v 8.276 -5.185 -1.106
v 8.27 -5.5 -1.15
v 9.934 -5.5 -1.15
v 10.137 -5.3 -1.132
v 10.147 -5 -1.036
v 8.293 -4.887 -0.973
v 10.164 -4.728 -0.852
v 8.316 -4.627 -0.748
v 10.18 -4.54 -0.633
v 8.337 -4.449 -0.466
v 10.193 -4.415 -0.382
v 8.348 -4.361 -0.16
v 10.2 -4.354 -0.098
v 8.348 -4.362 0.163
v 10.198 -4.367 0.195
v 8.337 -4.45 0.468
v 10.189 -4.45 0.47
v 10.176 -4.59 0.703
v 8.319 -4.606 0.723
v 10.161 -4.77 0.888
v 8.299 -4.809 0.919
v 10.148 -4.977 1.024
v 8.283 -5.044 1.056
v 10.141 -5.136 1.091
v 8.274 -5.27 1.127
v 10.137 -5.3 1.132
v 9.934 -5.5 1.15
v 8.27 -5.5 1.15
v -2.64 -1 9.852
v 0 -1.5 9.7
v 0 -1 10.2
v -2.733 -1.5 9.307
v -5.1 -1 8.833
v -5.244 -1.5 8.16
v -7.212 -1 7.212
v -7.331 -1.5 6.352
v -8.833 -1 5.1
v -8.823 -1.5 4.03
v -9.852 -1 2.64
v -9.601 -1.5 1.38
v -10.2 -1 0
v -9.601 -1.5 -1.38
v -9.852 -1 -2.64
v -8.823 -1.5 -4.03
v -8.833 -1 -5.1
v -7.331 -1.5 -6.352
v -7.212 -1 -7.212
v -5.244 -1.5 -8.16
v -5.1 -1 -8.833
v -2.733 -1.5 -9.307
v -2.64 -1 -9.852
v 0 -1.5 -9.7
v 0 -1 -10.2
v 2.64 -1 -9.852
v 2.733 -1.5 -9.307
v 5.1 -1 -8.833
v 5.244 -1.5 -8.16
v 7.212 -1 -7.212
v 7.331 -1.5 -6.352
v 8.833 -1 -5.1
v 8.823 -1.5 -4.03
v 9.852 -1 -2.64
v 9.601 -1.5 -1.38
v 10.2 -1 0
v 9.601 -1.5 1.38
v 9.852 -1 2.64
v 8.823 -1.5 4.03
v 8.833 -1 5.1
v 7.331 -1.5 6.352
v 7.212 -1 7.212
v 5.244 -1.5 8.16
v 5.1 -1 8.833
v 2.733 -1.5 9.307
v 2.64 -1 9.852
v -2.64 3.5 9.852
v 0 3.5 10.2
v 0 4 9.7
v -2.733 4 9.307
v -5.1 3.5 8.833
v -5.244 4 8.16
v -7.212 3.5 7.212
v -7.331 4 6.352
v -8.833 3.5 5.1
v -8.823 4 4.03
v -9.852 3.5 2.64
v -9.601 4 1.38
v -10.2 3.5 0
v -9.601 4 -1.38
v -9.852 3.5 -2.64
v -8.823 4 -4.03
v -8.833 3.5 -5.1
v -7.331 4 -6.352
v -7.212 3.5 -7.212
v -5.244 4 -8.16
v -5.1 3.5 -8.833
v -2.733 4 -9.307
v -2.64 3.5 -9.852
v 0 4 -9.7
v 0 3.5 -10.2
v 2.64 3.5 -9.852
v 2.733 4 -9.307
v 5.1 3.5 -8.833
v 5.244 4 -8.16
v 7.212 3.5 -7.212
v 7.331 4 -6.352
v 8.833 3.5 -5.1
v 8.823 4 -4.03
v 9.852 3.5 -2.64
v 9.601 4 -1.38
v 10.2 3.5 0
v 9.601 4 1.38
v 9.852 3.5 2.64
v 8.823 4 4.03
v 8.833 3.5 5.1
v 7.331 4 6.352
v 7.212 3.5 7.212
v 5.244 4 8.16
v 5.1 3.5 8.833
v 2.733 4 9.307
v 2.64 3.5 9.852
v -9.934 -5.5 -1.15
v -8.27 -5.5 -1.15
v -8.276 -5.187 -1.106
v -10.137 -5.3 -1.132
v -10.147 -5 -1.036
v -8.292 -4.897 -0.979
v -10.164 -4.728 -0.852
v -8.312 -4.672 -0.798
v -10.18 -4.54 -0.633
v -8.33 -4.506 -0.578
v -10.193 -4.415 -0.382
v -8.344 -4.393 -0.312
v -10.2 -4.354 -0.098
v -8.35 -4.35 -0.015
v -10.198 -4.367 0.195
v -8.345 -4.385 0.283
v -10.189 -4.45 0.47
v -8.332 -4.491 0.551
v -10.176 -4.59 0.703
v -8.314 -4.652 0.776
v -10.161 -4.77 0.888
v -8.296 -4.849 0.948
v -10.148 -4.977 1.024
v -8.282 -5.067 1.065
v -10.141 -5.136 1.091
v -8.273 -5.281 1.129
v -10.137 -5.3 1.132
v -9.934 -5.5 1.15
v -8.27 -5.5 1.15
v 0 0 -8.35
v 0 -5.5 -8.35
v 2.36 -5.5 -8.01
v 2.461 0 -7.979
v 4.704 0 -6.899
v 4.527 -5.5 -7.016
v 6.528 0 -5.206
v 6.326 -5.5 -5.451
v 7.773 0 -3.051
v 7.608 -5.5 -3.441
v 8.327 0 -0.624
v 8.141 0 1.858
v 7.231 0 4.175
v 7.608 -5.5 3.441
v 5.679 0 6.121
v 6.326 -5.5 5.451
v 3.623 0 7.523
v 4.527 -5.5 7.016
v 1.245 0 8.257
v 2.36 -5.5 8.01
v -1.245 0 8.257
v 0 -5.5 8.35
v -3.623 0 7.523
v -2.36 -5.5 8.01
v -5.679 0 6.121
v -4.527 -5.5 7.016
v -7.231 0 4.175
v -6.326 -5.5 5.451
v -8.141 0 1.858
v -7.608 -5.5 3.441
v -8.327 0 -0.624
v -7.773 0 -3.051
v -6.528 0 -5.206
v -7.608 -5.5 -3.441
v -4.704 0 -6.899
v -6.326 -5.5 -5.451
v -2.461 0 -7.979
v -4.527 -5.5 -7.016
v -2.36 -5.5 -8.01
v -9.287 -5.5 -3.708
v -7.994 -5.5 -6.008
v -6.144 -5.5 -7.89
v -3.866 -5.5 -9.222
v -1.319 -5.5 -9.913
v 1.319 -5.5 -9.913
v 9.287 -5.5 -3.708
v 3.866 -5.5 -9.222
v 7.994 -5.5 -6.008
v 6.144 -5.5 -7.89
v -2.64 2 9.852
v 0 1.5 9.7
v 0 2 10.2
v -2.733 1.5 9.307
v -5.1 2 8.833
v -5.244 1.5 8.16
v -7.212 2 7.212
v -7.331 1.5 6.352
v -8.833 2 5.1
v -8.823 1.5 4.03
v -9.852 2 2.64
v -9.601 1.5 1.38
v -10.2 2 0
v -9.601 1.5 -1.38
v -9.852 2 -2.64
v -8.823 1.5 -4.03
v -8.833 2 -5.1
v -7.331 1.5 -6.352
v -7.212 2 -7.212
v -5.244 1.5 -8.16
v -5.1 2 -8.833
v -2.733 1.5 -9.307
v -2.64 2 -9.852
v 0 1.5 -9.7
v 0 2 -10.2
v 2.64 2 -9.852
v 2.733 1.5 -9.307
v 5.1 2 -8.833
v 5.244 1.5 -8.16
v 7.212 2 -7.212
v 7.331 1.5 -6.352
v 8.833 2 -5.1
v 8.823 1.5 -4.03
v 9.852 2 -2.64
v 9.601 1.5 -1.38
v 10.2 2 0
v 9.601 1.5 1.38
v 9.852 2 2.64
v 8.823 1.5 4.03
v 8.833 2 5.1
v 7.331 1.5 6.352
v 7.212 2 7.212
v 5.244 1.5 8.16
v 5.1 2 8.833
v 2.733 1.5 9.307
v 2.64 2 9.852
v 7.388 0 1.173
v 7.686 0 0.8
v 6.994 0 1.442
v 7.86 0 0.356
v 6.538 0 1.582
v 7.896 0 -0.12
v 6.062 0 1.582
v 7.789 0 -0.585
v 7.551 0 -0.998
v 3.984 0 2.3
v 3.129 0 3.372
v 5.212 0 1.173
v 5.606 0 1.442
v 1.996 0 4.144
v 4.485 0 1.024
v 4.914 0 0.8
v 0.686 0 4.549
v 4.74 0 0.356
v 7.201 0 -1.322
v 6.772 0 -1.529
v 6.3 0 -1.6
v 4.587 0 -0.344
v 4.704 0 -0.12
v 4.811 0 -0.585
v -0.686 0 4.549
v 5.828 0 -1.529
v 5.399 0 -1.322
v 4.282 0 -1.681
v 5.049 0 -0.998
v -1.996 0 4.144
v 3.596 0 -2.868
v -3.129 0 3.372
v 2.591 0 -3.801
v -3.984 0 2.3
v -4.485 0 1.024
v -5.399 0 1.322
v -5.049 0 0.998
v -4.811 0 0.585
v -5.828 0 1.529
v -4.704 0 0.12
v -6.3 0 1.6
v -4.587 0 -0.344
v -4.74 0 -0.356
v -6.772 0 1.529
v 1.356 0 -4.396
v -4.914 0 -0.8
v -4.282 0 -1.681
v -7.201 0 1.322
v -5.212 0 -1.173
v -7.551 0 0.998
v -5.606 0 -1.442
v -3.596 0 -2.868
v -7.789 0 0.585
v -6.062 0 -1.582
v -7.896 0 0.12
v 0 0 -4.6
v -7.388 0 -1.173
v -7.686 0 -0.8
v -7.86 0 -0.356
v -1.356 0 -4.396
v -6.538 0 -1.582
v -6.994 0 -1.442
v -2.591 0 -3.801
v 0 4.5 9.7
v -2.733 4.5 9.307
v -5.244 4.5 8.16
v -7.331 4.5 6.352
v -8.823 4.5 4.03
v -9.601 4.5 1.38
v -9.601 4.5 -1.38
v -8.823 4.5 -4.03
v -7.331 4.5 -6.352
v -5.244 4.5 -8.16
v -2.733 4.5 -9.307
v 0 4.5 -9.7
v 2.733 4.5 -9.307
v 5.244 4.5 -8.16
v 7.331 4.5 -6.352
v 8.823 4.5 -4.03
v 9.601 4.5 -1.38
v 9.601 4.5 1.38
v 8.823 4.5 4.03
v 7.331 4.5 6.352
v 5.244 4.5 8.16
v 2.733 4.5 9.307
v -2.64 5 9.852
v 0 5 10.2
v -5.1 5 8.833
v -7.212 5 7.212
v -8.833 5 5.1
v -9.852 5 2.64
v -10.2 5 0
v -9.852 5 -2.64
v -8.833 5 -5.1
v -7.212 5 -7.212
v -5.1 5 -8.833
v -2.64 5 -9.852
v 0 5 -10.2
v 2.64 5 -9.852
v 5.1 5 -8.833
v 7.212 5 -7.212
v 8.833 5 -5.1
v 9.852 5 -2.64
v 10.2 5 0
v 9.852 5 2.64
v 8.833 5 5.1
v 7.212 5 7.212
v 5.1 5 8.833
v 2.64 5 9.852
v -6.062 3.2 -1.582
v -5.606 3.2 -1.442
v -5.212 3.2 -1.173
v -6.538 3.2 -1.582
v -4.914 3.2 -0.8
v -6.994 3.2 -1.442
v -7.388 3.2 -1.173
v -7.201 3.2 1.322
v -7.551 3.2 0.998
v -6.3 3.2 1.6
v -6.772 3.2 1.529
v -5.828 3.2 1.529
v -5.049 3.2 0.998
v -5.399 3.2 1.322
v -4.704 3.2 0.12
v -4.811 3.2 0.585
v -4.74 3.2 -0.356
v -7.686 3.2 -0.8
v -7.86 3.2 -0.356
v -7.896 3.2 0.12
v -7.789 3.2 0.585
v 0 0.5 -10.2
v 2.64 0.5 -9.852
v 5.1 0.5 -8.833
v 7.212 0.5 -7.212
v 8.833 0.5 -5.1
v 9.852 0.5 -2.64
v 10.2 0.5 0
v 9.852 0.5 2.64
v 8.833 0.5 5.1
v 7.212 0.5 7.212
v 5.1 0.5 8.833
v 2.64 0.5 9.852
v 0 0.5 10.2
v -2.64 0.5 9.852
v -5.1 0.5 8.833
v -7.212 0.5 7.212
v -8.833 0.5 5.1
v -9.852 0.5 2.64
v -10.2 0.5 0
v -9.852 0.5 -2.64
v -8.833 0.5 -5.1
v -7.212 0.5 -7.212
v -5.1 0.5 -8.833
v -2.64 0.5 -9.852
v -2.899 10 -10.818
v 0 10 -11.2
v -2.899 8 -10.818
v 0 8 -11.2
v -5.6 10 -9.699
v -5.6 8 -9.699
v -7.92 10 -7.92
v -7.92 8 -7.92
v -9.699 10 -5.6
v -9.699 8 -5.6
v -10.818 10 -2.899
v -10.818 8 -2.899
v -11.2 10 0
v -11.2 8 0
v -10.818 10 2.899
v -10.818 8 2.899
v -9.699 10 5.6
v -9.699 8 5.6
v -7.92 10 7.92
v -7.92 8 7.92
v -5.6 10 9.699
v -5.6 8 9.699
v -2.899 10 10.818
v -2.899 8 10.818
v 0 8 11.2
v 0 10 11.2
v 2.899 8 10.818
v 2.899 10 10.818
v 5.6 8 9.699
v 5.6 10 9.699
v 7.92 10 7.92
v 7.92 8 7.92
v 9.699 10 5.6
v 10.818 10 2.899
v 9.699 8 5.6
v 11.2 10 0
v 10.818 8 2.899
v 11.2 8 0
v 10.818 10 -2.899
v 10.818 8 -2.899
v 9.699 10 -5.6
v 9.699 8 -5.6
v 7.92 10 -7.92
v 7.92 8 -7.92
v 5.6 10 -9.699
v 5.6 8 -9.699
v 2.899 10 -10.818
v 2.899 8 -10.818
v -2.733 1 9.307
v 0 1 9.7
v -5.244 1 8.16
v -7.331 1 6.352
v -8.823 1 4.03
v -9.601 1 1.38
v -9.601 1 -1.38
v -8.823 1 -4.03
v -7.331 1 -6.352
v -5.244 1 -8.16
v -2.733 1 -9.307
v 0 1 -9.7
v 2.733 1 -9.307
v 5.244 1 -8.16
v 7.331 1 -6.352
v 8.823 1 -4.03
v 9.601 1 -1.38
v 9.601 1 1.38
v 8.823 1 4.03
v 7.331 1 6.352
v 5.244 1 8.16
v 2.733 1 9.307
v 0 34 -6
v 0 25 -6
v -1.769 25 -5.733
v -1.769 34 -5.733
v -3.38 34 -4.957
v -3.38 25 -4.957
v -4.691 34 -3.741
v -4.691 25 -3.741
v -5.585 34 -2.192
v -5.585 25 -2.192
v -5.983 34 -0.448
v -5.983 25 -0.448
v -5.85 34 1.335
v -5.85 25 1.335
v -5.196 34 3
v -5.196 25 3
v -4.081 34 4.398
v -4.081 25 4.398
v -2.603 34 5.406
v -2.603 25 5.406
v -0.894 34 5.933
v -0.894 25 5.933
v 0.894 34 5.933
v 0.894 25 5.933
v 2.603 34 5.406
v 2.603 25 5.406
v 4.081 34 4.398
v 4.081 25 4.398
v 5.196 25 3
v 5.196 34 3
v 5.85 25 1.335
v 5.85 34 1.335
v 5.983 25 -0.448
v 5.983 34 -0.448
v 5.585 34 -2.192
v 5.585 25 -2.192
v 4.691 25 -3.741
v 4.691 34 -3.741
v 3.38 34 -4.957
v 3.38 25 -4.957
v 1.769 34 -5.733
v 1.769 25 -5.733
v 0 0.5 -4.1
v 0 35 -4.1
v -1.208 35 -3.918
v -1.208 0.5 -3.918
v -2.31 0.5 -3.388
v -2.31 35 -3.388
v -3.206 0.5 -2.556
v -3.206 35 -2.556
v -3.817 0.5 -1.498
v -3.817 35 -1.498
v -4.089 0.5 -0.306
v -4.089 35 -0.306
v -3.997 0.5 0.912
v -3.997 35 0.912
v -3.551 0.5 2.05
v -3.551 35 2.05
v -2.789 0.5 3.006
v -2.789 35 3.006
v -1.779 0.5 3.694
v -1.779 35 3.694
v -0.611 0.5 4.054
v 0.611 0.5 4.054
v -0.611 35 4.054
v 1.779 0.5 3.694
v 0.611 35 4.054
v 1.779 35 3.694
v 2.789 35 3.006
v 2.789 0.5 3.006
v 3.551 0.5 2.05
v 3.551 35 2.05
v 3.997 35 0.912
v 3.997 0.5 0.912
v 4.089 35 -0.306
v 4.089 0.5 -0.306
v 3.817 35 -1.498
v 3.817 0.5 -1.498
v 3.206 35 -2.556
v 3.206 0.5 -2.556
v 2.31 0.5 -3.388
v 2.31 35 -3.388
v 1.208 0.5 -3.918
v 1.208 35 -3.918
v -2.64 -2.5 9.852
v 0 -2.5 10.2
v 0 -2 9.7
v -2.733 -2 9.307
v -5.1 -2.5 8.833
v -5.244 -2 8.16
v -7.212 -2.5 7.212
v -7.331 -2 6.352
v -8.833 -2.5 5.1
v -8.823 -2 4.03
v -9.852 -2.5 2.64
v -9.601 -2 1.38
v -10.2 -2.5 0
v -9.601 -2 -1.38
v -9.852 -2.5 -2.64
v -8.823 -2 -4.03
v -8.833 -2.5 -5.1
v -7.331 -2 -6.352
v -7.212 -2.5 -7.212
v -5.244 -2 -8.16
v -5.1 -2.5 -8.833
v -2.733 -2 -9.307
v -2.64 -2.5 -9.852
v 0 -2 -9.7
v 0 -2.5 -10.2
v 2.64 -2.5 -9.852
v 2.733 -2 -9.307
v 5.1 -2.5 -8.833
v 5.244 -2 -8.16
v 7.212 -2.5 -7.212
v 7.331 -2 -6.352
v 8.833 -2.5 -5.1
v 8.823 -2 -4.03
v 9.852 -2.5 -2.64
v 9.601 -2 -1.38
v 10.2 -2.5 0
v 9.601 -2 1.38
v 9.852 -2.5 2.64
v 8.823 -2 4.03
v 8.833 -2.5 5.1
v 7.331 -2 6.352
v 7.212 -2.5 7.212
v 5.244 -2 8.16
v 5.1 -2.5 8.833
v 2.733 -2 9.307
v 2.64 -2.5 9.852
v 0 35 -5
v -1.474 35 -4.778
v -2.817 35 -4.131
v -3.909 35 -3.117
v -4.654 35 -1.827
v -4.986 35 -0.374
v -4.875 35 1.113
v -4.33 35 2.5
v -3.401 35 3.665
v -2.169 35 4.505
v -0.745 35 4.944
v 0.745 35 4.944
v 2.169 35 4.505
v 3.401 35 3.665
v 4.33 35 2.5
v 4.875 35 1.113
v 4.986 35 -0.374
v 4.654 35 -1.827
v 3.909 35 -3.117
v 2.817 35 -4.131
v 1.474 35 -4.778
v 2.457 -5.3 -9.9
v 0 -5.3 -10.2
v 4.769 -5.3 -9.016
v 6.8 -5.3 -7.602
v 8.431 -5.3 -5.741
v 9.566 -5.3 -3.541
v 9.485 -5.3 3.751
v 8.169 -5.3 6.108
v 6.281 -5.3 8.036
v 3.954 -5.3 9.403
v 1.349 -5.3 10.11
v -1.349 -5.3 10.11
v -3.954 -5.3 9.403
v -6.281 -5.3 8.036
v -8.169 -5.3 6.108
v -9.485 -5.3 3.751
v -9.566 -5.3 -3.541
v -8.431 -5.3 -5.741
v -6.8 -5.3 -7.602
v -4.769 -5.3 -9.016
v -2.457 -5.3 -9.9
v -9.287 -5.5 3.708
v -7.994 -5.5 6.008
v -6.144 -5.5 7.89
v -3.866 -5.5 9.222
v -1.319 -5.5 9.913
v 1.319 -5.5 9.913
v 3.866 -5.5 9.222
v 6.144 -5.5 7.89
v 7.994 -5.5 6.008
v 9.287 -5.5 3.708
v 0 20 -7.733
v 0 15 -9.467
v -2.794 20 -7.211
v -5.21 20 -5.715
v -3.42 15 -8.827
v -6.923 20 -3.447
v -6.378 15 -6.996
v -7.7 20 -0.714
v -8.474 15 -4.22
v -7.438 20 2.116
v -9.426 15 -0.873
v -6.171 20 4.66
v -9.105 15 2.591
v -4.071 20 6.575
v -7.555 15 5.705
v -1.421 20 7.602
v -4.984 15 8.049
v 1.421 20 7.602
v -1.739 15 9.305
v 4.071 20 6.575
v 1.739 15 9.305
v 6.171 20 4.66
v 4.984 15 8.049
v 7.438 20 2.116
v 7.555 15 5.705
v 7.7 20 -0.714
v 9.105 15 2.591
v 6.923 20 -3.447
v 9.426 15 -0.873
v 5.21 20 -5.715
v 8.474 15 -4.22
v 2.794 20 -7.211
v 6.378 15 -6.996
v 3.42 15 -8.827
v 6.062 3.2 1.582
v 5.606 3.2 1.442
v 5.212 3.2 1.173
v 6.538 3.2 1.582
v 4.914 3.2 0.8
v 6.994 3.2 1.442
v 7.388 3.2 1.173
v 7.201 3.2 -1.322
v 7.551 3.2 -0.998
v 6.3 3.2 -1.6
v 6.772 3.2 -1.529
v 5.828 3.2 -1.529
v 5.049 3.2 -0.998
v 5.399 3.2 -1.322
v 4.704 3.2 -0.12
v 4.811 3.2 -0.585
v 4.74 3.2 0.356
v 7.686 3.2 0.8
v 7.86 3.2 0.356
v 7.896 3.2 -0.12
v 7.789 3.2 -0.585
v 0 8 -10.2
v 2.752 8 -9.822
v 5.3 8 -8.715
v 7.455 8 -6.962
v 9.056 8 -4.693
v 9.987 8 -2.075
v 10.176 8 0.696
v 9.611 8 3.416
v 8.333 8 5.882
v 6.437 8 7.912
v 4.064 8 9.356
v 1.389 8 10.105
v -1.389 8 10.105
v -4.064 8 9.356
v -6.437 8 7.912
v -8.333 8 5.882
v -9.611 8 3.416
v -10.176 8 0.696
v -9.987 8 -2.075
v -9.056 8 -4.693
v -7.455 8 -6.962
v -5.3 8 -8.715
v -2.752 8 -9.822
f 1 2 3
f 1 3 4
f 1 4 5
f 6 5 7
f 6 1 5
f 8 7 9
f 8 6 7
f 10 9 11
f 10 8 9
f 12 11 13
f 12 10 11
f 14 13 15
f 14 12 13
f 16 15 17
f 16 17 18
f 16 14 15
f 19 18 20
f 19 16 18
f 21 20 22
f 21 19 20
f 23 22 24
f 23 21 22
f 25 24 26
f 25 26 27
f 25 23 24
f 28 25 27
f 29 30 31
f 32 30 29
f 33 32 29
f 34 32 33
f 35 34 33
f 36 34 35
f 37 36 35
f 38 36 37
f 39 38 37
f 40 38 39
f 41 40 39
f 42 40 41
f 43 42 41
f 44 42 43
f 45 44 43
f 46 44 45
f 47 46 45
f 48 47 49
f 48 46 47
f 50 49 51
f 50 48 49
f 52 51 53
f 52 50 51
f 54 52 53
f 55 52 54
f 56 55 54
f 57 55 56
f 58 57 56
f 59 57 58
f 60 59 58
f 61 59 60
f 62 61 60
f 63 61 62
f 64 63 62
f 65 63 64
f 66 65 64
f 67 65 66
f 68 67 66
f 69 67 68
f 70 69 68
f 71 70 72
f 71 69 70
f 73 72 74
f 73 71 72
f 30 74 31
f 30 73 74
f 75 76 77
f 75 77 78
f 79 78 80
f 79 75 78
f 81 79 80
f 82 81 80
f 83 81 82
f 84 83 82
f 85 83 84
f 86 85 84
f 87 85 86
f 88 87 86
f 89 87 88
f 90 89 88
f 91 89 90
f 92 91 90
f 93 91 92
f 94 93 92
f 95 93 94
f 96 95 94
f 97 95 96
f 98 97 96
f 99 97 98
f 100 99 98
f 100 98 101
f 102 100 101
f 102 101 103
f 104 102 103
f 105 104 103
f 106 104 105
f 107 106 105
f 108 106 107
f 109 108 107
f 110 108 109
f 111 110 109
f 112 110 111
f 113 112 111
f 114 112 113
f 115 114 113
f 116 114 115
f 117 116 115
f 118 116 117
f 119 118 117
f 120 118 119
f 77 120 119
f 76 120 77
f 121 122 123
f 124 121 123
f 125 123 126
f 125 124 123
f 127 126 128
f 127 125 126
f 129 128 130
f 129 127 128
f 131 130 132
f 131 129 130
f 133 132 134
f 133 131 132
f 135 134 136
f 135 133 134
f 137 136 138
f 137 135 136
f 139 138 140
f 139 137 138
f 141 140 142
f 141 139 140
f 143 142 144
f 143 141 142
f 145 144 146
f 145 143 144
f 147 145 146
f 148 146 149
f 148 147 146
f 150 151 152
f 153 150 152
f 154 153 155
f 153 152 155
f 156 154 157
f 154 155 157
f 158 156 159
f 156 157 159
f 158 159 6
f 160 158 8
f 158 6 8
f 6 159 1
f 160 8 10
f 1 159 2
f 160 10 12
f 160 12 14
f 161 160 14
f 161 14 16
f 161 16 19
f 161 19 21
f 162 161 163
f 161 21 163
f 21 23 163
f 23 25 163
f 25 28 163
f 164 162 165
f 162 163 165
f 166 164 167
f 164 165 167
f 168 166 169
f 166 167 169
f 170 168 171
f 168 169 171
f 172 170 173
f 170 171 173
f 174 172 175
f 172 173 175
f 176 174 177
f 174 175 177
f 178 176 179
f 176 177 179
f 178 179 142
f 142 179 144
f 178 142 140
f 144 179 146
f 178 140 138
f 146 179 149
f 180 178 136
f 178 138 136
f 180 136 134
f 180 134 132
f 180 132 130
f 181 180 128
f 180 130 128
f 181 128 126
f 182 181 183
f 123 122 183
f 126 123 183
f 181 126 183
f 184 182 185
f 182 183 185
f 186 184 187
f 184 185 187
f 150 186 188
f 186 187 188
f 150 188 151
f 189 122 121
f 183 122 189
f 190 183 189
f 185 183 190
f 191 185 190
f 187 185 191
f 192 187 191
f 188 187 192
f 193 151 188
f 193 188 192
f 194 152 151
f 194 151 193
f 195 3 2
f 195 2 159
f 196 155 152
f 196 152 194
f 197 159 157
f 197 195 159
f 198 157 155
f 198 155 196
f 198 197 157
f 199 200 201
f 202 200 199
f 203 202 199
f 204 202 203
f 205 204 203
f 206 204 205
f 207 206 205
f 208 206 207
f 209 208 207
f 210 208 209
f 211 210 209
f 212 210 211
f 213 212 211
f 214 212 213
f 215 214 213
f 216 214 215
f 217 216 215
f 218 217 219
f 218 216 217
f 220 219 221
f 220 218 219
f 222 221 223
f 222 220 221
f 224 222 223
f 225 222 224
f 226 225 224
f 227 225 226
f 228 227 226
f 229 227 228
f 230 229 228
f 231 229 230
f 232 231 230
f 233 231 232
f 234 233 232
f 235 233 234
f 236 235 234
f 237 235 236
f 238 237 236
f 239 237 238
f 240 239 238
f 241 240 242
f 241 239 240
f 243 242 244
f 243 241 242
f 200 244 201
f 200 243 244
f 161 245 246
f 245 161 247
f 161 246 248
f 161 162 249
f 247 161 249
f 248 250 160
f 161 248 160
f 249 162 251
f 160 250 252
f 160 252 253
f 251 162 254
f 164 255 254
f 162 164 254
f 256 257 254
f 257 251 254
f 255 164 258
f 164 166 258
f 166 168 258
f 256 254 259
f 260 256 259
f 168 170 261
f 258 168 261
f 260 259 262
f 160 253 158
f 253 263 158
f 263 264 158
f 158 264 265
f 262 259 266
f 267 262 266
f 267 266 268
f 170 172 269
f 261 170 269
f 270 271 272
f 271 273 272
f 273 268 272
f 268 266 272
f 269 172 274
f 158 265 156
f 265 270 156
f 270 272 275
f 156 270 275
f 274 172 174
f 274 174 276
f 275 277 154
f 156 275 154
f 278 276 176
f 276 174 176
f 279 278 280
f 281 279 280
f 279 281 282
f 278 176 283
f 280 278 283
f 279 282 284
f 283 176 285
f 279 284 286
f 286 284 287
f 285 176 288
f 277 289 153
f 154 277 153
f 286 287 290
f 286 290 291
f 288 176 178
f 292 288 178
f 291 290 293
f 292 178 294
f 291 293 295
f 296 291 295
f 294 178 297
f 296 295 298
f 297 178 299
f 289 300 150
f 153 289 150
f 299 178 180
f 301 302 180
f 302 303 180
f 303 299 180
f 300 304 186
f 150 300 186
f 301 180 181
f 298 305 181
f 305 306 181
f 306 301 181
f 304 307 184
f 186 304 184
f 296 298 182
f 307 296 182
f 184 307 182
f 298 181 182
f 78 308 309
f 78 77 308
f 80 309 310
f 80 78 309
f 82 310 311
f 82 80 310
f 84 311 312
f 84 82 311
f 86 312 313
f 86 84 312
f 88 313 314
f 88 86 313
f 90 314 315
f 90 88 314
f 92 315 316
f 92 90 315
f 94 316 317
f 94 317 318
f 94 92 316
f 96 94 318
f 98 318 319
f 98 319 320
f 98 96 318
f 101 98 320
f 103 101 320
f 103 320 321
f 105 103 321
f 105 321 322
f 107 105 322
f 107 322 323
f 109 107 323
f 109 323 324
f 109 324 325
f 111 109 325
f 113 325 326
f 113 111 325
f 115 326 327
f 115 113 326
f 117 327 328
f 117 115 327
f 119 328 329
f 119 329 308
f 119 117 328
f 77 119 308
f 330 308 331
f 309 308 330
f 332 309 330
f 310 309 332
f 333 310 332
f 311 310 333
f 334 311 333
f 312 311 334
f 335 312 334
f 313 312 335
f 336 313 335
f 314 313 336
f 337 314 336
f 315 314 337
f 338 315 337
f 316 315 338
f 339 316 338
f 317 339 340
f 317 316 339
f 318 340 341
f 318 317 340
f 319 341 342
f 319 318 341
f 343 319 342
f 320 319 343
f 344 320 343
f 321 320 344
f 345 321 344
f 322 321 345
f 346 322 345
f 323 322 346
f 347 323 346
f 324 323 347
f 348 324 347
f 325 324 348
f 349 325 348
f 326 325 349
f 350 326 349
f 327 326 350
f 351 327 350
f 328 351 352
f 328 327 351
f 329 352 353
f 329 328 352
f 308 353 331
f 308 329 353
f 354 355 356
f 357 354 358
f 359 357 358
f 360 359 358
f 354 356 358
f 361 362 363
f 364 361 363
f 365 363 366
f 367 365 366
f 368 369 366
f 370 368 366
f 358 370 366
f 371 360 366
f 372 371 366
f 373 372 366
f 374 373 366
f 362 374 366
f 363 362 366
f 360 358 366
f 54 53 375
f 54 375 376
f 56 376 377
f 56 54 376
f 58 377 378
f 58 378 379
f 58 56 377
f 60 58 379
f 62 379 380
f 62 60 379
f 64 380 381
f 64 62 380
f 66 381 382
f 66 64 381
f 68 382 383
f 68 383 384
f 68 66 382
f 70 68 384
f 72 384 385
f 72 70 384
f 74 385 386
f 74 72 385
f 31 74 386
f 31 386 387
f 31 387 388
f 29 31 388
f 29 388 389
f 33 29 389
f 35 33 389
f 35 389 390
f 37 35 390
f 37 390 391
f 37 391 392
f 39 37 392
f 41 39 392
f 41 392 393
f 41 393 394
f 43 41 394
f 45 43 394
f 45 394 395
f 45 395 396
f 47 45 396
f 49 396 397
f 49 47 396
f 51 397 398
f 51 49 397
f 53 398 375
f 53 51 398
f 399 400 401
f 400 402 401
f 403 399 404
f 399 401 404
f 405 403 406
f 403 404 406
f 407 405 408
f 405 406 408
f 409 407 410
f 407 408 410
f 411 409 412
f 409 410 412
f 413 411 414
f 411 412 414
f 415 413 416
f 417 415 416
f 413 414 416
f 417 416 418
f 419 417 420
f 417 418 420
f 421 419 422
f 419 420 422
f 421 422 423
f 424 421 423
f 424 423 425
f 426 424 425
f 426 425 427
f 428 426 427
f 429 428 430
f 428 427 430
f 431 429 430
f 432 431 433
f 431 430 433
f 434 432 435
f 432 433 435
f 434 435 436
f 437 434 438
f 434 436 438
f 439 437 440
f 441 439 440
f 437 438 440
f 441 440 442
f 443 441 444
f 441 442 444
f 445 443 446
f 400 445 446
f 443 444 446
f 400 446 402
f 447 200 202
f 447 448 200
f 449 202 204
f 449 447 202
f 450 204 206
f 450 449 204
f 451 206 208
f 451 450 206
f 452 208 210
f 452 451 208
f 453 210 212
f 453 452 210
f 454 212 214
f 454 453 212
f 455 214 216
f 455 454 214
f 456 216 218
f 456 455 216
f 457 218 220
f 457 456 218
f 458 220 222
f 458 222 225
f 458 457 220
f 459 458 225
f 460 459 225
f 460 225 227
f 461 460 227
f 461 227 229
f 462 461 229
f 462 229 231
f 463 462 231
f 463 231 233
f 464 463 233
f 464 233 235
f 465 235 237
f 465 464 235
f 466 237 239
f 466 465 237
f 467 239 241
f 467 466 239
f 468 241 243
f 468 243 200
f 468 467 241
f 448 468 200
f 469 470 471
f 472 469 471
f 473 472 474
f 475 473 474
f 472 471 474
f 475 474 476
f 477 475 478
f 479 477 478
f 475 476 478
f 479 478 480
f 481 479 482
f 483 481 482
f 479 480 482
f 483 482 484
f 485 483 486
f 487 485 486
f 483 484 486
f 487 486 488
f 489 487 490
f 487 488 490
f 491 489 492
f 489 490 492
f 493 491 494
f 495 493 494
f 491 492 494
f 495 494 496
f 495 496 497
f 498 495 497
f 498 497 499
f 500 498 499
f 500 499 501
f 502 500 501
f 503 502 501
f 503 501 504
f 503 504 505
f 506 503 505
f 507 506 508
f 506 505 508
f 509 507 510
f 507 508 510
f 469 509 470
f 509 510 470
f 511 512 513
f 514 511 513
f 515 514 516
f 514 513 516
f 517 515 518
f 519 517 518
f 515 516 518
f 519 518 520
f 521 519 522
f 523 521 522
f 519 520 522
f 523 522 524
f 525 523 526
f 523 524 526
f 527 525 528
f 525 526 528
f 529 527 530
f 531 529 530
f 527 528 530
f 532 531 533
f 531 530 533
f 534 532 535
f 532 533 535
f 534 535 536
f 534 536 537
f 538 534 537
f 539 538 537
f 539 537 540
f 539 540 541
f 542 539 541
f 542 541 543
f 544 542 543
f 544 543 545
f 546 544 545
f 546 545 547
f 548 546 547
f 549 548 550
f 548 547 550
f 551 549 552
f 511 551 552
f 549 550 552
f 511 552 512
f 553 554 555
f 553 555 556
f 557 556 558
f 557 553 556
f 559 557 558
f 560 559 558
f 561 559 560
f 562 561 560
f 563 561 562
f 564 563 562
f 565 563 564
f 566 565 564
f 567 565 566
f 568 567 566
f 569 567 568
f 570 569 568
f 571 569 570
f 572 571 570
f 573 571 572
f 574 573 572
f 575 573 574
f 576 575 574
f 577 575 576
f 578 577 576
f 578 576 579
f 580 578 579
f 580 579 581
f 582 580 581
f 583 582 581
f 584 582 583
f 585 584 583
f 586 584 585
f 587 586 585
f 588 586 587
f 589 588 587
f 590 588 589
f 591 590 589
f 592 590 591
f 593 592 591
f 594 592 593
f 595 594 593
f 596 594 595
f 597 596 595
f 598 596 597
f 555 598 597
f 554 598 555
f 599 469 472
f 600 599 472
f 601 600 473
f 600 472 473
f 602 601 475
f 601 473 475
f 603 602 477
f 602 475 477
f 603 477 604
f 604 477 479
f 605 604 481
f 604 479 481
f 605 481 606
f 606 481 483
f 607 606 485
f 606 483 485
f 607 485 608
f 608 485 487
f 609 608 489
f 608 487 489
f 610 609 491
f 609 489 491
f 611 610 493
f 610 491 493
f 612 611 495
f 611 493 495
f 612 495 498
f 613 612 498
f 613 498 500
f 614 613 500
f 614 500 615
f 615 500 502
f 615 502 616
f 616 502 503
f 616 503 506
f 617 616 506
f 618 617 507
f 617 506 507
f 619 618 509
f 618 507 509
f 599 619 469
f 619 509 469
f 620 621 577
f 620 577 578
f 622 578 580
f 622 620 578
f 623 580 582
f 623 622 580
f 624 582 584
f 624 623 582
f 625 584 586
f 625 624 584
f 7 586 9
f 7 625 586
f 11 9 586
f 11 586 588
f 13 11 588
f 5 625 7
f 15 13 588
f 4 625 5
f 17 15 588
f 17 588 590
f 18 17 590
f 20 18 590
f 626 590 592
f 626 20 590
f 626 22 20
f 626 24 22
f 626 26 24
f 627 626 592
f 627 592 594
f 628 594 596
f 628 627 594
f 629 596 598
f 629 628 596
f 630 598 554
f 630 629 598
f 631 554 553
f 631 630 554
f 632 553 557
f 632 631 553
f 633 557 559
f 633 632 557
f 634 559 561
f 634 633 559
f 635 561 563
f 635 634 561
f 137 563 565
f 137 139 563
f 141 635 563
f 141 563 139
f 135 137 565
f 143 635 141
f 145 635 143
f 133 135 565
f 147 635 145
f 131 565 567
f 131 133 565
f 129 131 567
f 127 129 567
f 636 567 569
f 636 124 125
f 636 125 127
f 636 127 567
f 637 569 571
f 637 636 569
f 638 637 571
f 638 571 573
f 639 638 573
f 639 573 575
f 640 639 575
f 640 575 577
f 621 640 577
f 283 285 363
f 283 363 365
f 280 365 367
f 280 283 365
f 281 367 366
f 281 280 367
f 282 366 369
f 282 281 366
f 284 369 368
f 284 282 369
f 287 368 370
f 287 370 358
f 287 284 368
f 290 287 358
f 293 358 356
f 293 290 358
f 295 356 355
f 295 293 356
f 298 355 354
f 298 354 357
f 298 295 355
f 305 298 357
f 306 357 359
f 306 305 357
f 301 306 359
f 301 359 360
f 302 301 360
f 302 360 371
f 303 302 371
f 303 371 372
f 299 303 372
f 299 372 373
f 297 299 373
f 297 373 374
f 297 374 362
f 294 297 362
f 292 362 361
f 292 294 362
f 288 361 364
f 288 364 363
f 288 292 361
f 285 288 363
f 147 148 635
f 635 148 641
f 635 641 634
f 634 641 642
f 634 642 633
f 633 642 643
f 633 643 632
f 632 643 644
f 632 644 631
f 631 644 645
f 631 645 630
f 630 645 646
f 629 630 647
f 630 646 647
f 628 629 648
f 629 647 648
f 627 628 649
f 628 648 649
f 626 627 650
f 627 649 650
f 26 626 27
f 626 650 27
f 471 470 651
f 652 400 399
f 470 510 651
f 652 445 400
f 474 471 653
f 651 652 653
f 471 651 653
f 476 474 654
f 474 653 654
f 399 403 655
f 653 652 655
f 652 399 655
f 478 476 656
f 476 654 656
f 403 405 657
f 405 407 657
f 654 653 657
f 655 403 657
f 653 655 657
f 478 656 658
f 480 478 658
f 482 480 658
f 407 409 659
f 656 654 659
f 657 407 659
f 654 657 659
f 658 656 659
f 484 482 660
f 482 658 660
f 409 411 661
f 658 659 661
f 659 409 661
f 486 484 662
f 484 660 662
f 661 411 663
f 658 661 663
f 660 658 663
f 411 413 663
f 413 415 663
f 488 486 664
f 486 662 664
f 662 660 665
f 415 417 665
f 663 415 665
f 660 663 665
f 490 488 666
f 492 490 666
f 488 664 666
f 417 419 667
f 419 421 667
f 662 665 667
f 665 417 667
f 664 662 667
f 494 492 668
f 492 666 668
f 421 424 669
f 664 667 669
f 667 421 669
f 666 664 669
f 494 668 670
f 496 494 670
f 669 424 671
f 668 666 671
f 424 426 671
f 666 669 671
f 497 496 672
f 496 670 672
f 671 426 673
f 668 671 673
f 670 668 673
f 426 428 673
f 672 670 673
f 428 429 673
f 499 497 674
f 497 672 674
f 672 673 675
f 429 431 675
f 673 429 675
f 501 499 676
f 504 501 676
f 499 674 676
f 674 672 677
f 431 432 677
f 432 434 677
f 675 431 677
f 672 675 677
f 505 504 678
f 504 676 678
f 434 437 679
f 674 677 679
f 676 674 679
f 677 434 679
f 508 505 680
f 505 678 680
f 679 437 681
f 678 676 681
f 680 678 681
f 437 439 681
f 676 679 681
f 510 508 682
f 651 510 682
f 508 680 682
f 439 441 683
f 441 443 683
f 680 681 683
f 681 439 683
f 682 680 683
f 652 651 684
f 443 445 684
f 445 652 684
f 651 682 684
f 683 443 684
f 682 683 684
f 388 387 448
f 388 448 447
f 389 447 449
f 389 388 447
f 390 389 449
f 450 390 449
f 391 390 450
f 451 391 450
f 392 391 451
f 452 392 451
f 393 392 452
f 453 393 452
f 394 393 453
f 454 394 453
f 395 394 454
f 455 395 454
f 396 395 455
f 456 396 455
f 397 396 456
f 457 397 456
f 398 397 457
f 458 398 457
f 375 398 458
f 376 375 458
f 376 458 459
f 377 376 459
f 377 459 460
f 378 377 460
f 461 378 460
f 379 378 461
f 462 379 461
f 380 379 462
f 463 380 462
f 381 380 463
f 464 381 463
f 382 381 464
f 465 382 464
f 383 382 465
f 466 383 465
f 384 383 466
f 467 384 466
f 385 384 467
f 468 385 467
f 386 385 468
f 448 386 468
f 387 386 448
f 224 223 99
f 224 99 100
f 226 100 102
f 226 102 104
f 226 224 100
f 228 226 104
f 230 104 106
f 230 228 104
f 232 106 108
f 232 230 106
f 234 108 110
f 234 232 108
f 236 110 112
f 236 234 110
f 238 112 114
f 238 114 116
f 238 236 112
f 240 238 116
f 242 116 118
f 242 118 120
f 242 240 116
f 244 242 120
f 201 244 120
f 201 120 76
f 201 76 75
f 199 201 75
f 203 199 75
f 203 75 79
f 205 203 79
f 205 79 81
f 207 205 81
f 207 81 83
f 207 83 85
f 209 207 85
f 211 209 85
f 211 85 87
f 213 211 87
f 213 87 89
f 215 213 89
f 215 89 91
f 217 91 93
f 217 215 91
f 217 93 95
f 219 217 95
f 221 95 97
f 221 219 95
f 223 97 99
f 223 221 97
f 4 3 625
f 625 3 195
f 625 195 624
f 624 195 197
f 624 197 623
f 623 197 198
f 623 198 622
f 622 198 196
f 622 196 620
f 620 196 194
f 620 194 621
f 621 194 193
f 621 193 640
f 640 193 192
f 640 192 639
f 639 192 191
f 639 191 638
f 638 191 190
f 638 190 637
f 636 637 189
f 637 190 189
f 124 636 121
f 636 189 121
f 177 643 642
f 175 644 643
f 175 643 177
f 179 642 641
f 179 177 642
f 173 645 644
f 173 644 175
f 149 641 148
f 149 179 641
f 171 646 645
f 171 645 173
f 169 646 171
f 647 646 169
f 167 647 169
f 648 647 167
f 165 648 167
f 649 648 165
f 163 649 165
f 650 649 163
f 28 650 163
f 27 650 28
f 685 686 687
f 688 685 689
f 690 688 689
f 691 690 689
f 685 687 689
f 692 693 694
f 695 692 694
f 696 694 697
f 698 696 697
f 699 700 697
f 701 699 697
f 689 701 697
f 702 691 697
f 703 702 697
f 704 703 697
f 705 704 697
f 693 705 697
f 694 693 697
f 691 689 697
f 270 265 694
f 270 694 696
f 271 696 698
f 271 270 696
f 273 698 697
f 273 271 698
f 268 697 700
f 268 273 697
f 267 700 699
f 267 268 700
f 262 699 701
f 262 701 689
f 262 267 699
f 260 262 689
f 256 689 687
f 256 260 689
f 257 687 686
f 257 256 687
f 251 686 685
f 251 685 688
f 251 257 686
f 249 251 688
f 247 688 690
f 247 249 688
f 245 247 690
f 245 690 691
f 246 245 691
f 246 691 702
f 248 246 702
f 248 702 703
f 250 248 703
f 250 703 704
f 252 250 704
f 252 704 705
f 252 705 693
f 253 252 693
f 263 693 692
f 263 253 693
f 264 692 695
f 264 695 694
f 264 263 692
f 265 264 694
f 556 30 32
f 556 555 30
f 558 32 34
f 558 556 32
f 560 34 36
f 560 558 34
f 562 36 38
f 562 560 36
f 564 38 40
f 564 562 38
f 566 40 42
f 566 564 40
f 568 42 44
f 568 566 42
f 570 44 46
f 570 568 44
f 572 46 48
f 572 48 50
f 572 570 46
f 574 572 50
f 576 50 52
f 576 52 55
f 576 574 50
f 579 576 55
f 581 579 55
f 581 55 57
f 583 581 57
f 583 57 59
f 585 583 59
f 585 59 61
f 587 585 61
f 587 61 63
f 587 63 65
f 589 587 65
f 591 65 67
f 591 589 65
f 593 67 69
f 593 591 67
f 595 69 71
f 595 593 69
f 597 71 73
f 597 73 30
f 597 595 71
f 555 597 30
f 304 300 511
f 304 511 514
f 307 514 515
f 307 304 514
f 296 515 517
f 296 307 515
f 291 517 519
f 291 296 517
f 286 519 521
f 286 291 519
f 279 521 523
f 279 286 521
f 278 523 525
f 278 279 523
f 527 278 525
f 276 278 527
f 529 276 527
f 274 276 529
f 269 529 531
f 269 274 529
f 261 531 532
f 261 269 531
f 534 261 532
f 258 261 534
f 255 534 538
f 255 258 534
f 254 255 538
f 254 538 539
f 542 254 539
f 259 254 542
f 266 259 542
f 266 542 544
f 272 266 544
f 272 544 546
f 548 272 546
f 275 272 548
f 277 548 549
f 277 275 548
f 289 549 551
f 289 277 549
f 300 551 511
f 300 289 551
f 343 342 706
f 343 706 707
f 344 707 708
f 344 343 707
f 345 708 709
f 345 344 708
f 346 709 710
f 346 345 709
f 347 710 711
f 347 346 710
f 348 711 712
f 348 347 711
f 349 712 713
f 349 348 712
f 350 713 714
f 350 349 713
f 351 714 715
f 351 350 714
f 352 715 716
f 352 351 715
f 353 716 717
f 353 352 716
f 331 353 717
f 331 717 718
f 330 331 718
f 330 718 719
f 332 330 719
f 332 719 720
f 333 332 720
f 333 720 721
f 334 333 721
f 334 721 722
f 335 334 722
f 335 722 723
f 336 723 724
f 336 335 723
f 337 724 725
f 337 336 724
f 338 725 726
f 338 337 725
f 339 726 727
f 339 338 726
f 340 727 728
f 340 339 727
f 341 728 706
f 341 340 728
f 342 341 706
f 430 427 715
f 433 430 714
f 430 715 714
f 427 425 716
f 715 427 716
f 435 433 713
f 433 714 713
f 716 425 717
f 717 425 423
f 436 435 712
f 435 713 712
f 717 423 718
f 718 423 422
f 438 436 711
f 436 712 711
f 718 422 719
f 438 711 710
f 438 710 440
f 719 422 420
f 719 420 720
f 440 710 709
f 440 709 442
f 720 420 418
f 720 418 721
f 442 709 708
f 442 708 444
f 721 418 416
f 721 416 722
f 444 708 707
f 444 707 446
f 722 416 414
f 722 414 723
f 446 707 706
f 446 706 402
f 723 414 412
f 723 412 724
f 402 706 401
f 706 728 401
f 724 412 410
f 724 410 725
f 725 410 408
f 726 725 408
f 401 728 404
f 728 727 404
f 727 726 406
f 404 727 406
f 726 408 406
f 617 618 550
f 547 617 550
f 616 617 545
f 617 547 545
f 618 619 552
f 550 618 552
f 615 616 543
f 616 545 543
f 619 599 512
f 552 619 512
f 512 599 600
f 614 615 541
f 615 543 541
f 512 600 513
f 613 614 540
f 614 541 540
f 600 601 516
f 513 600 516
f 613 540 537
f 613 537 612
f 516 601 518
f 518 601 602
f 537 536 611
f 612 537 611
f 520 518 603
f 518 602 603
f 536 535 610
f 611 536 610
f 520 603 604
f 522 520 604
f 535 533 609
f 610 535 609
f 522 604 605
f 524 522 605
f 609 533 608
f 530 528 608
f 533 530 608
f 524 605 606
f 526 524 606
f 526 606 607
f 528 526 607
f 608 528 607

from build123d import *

# Parameters (mm, degrees)
CHAMFER_1_SIZE           = 1
SKETCH_2_R               = 1.6
CUT_EXTRUDE_1_DEPTH      = 3.2
EXTRUDE_START            = 5.5
SKETCH_3_R               = 10.2
SKETCH_3_R_2             = 8.35
EXTRUDE_1_DEPTH          = 5.5
CHAMFER_2_SIZE           = 0.5
CUT_EXTRUDE_2_DEPTH      = 39.417183655
CUT_EXTRUDE_2_DEPTH_BACK = 39.417183655
SKETCH_4_R               = 1.15


with BuildPart() as part:
    # 스케치1 → 회전1 (revolve)
    with BuildSketch(Plane(origin=(0, 0, 0), x_dir=(0, 0, -1), z_dir=(1, 0, 0))):
        Polygon((4.1, 0), (4.1, 35), (6, 35), (6, 25), (11.2, 10), (11.2, 8), (10.2, 8), (10.2, 5.7), (10.2, 4), (10.2, 0), align=None)
    revolve(axis=Axis((0, 0, 0), (0, 1, 0)))

    # 모따기1
    chamfer_1_edges = [part.edges().sort_by_distance(p)[0] for p in [
        (0, 35, 6),
    ]]
    chamfer(chamfer_1_edges, length=CHAMFER_1_SIZE)

    # 스케치2 → 컷-돌출1 (cut)
    with BuildSketch(Plane(origin=(0, 0, 0), x_dir=(1, 0, 0), z_dir=(0, 1, 0))):
        with Locations(Location((-6.3, 0, 0), (0, 0, 270))):
            Circle(SKETCH_2_R)
        with Locations(Location((6.3, 0, 0), (0, 0, 90))):
            Circle(SKETCH_2_R)
    extrude(amount=CUT_EXTRUDE_1_DEPTH, mode=Mode.SUBTRACT)

    # 스케치3 → 보스-돌출1 (add)
    with BuildSketch(Plane.XZ.offset(EXTRUDE_START)):
        with Locations(Location((0, 0, 0), (0, 0, 270))):
            Circle(SKETCH_3_R)
        with Locations(Location((0, 0, 0), (0, 0, 270))):
            Circle(SKETCH_3_R_2, mode=Mode.SUBTRACT)
    extrude(amount=-EXTRUDE_1_DEPTH)

    # 모따기2
    chamfer_2_edges = [part.edges().sort_by_distance(p)[0] for p in [
        (0, 0, 4.1),
    ]]
    chamfer(chamfer_2_edges, length=CHAMFER_2_SIZE)

    # 스케치4 → 컷-돌출2 (cut, two sides: drawn at the far end of the back side and taken through both)
    with BuildSketch(Plane(origin=(0, 0, 0), x_dir=(0, 0, -1), z_dir=(1, 0, 0)).offset(-CUT_EXTRUDE_2_DEPTH_BACK)):
        with Locations((0, -5.5)):
            Circle(SKETCH_4_R)
    extrude(amount=CUT_EXTRUDE_2_DEPTH + CUT_EXTRUDE_2_DEPTH_BACK, mode=Mode.SUBTRACT)

    # 스케치6 → 컷-회전1 (revolve, cut)
    with BuildSketch(Plane(origin=(0, 0, 0), x_dir=(0, 0, -1), z_dir=(1, 0, 0)), mode=Mode.PRIVATE) as cut_revolve_1_sk:
        Polygon((10.2, 5), (9.7, 4.5), (9.7, 4), (10.2, 3.5), (11.2, 3.5), (11.2, 5), align=None)
        Polygon((9.7, 1.5), (9.7, 1), (10.2, 0.5), (11.2, 0.5), (11.2, 2), (10.2, 2), align=None)
        Polygon((9.7, -1.5), (9.7, -2), (10.2, -2.5), (11.2, -2.5), (11.2, -1), (10.2, -1), align=None)
    revolve(cut_revolve_1_sk.sketch.rotate(Axis((0, 0, 0), (0, -1, 0)), 180), axis=Axis((0, 0, 0), (0, -1, 0)), mode=Mode.SUBTRACT)

    # 모따기3: read off the stored shape, not the designer's step
    # 모따기3 outline → 모따기3 (revolve, cut)
    with BuildSketch(Plane.XY):
        Polygon((10.2, -5.3), (10, -5.5), (10.2, -5.5), align=None)
    revolve(axis=Axis((0, 0, 0), (0, 1, 0)), mode=Mode.SUBTRACT)


solid = part.part
